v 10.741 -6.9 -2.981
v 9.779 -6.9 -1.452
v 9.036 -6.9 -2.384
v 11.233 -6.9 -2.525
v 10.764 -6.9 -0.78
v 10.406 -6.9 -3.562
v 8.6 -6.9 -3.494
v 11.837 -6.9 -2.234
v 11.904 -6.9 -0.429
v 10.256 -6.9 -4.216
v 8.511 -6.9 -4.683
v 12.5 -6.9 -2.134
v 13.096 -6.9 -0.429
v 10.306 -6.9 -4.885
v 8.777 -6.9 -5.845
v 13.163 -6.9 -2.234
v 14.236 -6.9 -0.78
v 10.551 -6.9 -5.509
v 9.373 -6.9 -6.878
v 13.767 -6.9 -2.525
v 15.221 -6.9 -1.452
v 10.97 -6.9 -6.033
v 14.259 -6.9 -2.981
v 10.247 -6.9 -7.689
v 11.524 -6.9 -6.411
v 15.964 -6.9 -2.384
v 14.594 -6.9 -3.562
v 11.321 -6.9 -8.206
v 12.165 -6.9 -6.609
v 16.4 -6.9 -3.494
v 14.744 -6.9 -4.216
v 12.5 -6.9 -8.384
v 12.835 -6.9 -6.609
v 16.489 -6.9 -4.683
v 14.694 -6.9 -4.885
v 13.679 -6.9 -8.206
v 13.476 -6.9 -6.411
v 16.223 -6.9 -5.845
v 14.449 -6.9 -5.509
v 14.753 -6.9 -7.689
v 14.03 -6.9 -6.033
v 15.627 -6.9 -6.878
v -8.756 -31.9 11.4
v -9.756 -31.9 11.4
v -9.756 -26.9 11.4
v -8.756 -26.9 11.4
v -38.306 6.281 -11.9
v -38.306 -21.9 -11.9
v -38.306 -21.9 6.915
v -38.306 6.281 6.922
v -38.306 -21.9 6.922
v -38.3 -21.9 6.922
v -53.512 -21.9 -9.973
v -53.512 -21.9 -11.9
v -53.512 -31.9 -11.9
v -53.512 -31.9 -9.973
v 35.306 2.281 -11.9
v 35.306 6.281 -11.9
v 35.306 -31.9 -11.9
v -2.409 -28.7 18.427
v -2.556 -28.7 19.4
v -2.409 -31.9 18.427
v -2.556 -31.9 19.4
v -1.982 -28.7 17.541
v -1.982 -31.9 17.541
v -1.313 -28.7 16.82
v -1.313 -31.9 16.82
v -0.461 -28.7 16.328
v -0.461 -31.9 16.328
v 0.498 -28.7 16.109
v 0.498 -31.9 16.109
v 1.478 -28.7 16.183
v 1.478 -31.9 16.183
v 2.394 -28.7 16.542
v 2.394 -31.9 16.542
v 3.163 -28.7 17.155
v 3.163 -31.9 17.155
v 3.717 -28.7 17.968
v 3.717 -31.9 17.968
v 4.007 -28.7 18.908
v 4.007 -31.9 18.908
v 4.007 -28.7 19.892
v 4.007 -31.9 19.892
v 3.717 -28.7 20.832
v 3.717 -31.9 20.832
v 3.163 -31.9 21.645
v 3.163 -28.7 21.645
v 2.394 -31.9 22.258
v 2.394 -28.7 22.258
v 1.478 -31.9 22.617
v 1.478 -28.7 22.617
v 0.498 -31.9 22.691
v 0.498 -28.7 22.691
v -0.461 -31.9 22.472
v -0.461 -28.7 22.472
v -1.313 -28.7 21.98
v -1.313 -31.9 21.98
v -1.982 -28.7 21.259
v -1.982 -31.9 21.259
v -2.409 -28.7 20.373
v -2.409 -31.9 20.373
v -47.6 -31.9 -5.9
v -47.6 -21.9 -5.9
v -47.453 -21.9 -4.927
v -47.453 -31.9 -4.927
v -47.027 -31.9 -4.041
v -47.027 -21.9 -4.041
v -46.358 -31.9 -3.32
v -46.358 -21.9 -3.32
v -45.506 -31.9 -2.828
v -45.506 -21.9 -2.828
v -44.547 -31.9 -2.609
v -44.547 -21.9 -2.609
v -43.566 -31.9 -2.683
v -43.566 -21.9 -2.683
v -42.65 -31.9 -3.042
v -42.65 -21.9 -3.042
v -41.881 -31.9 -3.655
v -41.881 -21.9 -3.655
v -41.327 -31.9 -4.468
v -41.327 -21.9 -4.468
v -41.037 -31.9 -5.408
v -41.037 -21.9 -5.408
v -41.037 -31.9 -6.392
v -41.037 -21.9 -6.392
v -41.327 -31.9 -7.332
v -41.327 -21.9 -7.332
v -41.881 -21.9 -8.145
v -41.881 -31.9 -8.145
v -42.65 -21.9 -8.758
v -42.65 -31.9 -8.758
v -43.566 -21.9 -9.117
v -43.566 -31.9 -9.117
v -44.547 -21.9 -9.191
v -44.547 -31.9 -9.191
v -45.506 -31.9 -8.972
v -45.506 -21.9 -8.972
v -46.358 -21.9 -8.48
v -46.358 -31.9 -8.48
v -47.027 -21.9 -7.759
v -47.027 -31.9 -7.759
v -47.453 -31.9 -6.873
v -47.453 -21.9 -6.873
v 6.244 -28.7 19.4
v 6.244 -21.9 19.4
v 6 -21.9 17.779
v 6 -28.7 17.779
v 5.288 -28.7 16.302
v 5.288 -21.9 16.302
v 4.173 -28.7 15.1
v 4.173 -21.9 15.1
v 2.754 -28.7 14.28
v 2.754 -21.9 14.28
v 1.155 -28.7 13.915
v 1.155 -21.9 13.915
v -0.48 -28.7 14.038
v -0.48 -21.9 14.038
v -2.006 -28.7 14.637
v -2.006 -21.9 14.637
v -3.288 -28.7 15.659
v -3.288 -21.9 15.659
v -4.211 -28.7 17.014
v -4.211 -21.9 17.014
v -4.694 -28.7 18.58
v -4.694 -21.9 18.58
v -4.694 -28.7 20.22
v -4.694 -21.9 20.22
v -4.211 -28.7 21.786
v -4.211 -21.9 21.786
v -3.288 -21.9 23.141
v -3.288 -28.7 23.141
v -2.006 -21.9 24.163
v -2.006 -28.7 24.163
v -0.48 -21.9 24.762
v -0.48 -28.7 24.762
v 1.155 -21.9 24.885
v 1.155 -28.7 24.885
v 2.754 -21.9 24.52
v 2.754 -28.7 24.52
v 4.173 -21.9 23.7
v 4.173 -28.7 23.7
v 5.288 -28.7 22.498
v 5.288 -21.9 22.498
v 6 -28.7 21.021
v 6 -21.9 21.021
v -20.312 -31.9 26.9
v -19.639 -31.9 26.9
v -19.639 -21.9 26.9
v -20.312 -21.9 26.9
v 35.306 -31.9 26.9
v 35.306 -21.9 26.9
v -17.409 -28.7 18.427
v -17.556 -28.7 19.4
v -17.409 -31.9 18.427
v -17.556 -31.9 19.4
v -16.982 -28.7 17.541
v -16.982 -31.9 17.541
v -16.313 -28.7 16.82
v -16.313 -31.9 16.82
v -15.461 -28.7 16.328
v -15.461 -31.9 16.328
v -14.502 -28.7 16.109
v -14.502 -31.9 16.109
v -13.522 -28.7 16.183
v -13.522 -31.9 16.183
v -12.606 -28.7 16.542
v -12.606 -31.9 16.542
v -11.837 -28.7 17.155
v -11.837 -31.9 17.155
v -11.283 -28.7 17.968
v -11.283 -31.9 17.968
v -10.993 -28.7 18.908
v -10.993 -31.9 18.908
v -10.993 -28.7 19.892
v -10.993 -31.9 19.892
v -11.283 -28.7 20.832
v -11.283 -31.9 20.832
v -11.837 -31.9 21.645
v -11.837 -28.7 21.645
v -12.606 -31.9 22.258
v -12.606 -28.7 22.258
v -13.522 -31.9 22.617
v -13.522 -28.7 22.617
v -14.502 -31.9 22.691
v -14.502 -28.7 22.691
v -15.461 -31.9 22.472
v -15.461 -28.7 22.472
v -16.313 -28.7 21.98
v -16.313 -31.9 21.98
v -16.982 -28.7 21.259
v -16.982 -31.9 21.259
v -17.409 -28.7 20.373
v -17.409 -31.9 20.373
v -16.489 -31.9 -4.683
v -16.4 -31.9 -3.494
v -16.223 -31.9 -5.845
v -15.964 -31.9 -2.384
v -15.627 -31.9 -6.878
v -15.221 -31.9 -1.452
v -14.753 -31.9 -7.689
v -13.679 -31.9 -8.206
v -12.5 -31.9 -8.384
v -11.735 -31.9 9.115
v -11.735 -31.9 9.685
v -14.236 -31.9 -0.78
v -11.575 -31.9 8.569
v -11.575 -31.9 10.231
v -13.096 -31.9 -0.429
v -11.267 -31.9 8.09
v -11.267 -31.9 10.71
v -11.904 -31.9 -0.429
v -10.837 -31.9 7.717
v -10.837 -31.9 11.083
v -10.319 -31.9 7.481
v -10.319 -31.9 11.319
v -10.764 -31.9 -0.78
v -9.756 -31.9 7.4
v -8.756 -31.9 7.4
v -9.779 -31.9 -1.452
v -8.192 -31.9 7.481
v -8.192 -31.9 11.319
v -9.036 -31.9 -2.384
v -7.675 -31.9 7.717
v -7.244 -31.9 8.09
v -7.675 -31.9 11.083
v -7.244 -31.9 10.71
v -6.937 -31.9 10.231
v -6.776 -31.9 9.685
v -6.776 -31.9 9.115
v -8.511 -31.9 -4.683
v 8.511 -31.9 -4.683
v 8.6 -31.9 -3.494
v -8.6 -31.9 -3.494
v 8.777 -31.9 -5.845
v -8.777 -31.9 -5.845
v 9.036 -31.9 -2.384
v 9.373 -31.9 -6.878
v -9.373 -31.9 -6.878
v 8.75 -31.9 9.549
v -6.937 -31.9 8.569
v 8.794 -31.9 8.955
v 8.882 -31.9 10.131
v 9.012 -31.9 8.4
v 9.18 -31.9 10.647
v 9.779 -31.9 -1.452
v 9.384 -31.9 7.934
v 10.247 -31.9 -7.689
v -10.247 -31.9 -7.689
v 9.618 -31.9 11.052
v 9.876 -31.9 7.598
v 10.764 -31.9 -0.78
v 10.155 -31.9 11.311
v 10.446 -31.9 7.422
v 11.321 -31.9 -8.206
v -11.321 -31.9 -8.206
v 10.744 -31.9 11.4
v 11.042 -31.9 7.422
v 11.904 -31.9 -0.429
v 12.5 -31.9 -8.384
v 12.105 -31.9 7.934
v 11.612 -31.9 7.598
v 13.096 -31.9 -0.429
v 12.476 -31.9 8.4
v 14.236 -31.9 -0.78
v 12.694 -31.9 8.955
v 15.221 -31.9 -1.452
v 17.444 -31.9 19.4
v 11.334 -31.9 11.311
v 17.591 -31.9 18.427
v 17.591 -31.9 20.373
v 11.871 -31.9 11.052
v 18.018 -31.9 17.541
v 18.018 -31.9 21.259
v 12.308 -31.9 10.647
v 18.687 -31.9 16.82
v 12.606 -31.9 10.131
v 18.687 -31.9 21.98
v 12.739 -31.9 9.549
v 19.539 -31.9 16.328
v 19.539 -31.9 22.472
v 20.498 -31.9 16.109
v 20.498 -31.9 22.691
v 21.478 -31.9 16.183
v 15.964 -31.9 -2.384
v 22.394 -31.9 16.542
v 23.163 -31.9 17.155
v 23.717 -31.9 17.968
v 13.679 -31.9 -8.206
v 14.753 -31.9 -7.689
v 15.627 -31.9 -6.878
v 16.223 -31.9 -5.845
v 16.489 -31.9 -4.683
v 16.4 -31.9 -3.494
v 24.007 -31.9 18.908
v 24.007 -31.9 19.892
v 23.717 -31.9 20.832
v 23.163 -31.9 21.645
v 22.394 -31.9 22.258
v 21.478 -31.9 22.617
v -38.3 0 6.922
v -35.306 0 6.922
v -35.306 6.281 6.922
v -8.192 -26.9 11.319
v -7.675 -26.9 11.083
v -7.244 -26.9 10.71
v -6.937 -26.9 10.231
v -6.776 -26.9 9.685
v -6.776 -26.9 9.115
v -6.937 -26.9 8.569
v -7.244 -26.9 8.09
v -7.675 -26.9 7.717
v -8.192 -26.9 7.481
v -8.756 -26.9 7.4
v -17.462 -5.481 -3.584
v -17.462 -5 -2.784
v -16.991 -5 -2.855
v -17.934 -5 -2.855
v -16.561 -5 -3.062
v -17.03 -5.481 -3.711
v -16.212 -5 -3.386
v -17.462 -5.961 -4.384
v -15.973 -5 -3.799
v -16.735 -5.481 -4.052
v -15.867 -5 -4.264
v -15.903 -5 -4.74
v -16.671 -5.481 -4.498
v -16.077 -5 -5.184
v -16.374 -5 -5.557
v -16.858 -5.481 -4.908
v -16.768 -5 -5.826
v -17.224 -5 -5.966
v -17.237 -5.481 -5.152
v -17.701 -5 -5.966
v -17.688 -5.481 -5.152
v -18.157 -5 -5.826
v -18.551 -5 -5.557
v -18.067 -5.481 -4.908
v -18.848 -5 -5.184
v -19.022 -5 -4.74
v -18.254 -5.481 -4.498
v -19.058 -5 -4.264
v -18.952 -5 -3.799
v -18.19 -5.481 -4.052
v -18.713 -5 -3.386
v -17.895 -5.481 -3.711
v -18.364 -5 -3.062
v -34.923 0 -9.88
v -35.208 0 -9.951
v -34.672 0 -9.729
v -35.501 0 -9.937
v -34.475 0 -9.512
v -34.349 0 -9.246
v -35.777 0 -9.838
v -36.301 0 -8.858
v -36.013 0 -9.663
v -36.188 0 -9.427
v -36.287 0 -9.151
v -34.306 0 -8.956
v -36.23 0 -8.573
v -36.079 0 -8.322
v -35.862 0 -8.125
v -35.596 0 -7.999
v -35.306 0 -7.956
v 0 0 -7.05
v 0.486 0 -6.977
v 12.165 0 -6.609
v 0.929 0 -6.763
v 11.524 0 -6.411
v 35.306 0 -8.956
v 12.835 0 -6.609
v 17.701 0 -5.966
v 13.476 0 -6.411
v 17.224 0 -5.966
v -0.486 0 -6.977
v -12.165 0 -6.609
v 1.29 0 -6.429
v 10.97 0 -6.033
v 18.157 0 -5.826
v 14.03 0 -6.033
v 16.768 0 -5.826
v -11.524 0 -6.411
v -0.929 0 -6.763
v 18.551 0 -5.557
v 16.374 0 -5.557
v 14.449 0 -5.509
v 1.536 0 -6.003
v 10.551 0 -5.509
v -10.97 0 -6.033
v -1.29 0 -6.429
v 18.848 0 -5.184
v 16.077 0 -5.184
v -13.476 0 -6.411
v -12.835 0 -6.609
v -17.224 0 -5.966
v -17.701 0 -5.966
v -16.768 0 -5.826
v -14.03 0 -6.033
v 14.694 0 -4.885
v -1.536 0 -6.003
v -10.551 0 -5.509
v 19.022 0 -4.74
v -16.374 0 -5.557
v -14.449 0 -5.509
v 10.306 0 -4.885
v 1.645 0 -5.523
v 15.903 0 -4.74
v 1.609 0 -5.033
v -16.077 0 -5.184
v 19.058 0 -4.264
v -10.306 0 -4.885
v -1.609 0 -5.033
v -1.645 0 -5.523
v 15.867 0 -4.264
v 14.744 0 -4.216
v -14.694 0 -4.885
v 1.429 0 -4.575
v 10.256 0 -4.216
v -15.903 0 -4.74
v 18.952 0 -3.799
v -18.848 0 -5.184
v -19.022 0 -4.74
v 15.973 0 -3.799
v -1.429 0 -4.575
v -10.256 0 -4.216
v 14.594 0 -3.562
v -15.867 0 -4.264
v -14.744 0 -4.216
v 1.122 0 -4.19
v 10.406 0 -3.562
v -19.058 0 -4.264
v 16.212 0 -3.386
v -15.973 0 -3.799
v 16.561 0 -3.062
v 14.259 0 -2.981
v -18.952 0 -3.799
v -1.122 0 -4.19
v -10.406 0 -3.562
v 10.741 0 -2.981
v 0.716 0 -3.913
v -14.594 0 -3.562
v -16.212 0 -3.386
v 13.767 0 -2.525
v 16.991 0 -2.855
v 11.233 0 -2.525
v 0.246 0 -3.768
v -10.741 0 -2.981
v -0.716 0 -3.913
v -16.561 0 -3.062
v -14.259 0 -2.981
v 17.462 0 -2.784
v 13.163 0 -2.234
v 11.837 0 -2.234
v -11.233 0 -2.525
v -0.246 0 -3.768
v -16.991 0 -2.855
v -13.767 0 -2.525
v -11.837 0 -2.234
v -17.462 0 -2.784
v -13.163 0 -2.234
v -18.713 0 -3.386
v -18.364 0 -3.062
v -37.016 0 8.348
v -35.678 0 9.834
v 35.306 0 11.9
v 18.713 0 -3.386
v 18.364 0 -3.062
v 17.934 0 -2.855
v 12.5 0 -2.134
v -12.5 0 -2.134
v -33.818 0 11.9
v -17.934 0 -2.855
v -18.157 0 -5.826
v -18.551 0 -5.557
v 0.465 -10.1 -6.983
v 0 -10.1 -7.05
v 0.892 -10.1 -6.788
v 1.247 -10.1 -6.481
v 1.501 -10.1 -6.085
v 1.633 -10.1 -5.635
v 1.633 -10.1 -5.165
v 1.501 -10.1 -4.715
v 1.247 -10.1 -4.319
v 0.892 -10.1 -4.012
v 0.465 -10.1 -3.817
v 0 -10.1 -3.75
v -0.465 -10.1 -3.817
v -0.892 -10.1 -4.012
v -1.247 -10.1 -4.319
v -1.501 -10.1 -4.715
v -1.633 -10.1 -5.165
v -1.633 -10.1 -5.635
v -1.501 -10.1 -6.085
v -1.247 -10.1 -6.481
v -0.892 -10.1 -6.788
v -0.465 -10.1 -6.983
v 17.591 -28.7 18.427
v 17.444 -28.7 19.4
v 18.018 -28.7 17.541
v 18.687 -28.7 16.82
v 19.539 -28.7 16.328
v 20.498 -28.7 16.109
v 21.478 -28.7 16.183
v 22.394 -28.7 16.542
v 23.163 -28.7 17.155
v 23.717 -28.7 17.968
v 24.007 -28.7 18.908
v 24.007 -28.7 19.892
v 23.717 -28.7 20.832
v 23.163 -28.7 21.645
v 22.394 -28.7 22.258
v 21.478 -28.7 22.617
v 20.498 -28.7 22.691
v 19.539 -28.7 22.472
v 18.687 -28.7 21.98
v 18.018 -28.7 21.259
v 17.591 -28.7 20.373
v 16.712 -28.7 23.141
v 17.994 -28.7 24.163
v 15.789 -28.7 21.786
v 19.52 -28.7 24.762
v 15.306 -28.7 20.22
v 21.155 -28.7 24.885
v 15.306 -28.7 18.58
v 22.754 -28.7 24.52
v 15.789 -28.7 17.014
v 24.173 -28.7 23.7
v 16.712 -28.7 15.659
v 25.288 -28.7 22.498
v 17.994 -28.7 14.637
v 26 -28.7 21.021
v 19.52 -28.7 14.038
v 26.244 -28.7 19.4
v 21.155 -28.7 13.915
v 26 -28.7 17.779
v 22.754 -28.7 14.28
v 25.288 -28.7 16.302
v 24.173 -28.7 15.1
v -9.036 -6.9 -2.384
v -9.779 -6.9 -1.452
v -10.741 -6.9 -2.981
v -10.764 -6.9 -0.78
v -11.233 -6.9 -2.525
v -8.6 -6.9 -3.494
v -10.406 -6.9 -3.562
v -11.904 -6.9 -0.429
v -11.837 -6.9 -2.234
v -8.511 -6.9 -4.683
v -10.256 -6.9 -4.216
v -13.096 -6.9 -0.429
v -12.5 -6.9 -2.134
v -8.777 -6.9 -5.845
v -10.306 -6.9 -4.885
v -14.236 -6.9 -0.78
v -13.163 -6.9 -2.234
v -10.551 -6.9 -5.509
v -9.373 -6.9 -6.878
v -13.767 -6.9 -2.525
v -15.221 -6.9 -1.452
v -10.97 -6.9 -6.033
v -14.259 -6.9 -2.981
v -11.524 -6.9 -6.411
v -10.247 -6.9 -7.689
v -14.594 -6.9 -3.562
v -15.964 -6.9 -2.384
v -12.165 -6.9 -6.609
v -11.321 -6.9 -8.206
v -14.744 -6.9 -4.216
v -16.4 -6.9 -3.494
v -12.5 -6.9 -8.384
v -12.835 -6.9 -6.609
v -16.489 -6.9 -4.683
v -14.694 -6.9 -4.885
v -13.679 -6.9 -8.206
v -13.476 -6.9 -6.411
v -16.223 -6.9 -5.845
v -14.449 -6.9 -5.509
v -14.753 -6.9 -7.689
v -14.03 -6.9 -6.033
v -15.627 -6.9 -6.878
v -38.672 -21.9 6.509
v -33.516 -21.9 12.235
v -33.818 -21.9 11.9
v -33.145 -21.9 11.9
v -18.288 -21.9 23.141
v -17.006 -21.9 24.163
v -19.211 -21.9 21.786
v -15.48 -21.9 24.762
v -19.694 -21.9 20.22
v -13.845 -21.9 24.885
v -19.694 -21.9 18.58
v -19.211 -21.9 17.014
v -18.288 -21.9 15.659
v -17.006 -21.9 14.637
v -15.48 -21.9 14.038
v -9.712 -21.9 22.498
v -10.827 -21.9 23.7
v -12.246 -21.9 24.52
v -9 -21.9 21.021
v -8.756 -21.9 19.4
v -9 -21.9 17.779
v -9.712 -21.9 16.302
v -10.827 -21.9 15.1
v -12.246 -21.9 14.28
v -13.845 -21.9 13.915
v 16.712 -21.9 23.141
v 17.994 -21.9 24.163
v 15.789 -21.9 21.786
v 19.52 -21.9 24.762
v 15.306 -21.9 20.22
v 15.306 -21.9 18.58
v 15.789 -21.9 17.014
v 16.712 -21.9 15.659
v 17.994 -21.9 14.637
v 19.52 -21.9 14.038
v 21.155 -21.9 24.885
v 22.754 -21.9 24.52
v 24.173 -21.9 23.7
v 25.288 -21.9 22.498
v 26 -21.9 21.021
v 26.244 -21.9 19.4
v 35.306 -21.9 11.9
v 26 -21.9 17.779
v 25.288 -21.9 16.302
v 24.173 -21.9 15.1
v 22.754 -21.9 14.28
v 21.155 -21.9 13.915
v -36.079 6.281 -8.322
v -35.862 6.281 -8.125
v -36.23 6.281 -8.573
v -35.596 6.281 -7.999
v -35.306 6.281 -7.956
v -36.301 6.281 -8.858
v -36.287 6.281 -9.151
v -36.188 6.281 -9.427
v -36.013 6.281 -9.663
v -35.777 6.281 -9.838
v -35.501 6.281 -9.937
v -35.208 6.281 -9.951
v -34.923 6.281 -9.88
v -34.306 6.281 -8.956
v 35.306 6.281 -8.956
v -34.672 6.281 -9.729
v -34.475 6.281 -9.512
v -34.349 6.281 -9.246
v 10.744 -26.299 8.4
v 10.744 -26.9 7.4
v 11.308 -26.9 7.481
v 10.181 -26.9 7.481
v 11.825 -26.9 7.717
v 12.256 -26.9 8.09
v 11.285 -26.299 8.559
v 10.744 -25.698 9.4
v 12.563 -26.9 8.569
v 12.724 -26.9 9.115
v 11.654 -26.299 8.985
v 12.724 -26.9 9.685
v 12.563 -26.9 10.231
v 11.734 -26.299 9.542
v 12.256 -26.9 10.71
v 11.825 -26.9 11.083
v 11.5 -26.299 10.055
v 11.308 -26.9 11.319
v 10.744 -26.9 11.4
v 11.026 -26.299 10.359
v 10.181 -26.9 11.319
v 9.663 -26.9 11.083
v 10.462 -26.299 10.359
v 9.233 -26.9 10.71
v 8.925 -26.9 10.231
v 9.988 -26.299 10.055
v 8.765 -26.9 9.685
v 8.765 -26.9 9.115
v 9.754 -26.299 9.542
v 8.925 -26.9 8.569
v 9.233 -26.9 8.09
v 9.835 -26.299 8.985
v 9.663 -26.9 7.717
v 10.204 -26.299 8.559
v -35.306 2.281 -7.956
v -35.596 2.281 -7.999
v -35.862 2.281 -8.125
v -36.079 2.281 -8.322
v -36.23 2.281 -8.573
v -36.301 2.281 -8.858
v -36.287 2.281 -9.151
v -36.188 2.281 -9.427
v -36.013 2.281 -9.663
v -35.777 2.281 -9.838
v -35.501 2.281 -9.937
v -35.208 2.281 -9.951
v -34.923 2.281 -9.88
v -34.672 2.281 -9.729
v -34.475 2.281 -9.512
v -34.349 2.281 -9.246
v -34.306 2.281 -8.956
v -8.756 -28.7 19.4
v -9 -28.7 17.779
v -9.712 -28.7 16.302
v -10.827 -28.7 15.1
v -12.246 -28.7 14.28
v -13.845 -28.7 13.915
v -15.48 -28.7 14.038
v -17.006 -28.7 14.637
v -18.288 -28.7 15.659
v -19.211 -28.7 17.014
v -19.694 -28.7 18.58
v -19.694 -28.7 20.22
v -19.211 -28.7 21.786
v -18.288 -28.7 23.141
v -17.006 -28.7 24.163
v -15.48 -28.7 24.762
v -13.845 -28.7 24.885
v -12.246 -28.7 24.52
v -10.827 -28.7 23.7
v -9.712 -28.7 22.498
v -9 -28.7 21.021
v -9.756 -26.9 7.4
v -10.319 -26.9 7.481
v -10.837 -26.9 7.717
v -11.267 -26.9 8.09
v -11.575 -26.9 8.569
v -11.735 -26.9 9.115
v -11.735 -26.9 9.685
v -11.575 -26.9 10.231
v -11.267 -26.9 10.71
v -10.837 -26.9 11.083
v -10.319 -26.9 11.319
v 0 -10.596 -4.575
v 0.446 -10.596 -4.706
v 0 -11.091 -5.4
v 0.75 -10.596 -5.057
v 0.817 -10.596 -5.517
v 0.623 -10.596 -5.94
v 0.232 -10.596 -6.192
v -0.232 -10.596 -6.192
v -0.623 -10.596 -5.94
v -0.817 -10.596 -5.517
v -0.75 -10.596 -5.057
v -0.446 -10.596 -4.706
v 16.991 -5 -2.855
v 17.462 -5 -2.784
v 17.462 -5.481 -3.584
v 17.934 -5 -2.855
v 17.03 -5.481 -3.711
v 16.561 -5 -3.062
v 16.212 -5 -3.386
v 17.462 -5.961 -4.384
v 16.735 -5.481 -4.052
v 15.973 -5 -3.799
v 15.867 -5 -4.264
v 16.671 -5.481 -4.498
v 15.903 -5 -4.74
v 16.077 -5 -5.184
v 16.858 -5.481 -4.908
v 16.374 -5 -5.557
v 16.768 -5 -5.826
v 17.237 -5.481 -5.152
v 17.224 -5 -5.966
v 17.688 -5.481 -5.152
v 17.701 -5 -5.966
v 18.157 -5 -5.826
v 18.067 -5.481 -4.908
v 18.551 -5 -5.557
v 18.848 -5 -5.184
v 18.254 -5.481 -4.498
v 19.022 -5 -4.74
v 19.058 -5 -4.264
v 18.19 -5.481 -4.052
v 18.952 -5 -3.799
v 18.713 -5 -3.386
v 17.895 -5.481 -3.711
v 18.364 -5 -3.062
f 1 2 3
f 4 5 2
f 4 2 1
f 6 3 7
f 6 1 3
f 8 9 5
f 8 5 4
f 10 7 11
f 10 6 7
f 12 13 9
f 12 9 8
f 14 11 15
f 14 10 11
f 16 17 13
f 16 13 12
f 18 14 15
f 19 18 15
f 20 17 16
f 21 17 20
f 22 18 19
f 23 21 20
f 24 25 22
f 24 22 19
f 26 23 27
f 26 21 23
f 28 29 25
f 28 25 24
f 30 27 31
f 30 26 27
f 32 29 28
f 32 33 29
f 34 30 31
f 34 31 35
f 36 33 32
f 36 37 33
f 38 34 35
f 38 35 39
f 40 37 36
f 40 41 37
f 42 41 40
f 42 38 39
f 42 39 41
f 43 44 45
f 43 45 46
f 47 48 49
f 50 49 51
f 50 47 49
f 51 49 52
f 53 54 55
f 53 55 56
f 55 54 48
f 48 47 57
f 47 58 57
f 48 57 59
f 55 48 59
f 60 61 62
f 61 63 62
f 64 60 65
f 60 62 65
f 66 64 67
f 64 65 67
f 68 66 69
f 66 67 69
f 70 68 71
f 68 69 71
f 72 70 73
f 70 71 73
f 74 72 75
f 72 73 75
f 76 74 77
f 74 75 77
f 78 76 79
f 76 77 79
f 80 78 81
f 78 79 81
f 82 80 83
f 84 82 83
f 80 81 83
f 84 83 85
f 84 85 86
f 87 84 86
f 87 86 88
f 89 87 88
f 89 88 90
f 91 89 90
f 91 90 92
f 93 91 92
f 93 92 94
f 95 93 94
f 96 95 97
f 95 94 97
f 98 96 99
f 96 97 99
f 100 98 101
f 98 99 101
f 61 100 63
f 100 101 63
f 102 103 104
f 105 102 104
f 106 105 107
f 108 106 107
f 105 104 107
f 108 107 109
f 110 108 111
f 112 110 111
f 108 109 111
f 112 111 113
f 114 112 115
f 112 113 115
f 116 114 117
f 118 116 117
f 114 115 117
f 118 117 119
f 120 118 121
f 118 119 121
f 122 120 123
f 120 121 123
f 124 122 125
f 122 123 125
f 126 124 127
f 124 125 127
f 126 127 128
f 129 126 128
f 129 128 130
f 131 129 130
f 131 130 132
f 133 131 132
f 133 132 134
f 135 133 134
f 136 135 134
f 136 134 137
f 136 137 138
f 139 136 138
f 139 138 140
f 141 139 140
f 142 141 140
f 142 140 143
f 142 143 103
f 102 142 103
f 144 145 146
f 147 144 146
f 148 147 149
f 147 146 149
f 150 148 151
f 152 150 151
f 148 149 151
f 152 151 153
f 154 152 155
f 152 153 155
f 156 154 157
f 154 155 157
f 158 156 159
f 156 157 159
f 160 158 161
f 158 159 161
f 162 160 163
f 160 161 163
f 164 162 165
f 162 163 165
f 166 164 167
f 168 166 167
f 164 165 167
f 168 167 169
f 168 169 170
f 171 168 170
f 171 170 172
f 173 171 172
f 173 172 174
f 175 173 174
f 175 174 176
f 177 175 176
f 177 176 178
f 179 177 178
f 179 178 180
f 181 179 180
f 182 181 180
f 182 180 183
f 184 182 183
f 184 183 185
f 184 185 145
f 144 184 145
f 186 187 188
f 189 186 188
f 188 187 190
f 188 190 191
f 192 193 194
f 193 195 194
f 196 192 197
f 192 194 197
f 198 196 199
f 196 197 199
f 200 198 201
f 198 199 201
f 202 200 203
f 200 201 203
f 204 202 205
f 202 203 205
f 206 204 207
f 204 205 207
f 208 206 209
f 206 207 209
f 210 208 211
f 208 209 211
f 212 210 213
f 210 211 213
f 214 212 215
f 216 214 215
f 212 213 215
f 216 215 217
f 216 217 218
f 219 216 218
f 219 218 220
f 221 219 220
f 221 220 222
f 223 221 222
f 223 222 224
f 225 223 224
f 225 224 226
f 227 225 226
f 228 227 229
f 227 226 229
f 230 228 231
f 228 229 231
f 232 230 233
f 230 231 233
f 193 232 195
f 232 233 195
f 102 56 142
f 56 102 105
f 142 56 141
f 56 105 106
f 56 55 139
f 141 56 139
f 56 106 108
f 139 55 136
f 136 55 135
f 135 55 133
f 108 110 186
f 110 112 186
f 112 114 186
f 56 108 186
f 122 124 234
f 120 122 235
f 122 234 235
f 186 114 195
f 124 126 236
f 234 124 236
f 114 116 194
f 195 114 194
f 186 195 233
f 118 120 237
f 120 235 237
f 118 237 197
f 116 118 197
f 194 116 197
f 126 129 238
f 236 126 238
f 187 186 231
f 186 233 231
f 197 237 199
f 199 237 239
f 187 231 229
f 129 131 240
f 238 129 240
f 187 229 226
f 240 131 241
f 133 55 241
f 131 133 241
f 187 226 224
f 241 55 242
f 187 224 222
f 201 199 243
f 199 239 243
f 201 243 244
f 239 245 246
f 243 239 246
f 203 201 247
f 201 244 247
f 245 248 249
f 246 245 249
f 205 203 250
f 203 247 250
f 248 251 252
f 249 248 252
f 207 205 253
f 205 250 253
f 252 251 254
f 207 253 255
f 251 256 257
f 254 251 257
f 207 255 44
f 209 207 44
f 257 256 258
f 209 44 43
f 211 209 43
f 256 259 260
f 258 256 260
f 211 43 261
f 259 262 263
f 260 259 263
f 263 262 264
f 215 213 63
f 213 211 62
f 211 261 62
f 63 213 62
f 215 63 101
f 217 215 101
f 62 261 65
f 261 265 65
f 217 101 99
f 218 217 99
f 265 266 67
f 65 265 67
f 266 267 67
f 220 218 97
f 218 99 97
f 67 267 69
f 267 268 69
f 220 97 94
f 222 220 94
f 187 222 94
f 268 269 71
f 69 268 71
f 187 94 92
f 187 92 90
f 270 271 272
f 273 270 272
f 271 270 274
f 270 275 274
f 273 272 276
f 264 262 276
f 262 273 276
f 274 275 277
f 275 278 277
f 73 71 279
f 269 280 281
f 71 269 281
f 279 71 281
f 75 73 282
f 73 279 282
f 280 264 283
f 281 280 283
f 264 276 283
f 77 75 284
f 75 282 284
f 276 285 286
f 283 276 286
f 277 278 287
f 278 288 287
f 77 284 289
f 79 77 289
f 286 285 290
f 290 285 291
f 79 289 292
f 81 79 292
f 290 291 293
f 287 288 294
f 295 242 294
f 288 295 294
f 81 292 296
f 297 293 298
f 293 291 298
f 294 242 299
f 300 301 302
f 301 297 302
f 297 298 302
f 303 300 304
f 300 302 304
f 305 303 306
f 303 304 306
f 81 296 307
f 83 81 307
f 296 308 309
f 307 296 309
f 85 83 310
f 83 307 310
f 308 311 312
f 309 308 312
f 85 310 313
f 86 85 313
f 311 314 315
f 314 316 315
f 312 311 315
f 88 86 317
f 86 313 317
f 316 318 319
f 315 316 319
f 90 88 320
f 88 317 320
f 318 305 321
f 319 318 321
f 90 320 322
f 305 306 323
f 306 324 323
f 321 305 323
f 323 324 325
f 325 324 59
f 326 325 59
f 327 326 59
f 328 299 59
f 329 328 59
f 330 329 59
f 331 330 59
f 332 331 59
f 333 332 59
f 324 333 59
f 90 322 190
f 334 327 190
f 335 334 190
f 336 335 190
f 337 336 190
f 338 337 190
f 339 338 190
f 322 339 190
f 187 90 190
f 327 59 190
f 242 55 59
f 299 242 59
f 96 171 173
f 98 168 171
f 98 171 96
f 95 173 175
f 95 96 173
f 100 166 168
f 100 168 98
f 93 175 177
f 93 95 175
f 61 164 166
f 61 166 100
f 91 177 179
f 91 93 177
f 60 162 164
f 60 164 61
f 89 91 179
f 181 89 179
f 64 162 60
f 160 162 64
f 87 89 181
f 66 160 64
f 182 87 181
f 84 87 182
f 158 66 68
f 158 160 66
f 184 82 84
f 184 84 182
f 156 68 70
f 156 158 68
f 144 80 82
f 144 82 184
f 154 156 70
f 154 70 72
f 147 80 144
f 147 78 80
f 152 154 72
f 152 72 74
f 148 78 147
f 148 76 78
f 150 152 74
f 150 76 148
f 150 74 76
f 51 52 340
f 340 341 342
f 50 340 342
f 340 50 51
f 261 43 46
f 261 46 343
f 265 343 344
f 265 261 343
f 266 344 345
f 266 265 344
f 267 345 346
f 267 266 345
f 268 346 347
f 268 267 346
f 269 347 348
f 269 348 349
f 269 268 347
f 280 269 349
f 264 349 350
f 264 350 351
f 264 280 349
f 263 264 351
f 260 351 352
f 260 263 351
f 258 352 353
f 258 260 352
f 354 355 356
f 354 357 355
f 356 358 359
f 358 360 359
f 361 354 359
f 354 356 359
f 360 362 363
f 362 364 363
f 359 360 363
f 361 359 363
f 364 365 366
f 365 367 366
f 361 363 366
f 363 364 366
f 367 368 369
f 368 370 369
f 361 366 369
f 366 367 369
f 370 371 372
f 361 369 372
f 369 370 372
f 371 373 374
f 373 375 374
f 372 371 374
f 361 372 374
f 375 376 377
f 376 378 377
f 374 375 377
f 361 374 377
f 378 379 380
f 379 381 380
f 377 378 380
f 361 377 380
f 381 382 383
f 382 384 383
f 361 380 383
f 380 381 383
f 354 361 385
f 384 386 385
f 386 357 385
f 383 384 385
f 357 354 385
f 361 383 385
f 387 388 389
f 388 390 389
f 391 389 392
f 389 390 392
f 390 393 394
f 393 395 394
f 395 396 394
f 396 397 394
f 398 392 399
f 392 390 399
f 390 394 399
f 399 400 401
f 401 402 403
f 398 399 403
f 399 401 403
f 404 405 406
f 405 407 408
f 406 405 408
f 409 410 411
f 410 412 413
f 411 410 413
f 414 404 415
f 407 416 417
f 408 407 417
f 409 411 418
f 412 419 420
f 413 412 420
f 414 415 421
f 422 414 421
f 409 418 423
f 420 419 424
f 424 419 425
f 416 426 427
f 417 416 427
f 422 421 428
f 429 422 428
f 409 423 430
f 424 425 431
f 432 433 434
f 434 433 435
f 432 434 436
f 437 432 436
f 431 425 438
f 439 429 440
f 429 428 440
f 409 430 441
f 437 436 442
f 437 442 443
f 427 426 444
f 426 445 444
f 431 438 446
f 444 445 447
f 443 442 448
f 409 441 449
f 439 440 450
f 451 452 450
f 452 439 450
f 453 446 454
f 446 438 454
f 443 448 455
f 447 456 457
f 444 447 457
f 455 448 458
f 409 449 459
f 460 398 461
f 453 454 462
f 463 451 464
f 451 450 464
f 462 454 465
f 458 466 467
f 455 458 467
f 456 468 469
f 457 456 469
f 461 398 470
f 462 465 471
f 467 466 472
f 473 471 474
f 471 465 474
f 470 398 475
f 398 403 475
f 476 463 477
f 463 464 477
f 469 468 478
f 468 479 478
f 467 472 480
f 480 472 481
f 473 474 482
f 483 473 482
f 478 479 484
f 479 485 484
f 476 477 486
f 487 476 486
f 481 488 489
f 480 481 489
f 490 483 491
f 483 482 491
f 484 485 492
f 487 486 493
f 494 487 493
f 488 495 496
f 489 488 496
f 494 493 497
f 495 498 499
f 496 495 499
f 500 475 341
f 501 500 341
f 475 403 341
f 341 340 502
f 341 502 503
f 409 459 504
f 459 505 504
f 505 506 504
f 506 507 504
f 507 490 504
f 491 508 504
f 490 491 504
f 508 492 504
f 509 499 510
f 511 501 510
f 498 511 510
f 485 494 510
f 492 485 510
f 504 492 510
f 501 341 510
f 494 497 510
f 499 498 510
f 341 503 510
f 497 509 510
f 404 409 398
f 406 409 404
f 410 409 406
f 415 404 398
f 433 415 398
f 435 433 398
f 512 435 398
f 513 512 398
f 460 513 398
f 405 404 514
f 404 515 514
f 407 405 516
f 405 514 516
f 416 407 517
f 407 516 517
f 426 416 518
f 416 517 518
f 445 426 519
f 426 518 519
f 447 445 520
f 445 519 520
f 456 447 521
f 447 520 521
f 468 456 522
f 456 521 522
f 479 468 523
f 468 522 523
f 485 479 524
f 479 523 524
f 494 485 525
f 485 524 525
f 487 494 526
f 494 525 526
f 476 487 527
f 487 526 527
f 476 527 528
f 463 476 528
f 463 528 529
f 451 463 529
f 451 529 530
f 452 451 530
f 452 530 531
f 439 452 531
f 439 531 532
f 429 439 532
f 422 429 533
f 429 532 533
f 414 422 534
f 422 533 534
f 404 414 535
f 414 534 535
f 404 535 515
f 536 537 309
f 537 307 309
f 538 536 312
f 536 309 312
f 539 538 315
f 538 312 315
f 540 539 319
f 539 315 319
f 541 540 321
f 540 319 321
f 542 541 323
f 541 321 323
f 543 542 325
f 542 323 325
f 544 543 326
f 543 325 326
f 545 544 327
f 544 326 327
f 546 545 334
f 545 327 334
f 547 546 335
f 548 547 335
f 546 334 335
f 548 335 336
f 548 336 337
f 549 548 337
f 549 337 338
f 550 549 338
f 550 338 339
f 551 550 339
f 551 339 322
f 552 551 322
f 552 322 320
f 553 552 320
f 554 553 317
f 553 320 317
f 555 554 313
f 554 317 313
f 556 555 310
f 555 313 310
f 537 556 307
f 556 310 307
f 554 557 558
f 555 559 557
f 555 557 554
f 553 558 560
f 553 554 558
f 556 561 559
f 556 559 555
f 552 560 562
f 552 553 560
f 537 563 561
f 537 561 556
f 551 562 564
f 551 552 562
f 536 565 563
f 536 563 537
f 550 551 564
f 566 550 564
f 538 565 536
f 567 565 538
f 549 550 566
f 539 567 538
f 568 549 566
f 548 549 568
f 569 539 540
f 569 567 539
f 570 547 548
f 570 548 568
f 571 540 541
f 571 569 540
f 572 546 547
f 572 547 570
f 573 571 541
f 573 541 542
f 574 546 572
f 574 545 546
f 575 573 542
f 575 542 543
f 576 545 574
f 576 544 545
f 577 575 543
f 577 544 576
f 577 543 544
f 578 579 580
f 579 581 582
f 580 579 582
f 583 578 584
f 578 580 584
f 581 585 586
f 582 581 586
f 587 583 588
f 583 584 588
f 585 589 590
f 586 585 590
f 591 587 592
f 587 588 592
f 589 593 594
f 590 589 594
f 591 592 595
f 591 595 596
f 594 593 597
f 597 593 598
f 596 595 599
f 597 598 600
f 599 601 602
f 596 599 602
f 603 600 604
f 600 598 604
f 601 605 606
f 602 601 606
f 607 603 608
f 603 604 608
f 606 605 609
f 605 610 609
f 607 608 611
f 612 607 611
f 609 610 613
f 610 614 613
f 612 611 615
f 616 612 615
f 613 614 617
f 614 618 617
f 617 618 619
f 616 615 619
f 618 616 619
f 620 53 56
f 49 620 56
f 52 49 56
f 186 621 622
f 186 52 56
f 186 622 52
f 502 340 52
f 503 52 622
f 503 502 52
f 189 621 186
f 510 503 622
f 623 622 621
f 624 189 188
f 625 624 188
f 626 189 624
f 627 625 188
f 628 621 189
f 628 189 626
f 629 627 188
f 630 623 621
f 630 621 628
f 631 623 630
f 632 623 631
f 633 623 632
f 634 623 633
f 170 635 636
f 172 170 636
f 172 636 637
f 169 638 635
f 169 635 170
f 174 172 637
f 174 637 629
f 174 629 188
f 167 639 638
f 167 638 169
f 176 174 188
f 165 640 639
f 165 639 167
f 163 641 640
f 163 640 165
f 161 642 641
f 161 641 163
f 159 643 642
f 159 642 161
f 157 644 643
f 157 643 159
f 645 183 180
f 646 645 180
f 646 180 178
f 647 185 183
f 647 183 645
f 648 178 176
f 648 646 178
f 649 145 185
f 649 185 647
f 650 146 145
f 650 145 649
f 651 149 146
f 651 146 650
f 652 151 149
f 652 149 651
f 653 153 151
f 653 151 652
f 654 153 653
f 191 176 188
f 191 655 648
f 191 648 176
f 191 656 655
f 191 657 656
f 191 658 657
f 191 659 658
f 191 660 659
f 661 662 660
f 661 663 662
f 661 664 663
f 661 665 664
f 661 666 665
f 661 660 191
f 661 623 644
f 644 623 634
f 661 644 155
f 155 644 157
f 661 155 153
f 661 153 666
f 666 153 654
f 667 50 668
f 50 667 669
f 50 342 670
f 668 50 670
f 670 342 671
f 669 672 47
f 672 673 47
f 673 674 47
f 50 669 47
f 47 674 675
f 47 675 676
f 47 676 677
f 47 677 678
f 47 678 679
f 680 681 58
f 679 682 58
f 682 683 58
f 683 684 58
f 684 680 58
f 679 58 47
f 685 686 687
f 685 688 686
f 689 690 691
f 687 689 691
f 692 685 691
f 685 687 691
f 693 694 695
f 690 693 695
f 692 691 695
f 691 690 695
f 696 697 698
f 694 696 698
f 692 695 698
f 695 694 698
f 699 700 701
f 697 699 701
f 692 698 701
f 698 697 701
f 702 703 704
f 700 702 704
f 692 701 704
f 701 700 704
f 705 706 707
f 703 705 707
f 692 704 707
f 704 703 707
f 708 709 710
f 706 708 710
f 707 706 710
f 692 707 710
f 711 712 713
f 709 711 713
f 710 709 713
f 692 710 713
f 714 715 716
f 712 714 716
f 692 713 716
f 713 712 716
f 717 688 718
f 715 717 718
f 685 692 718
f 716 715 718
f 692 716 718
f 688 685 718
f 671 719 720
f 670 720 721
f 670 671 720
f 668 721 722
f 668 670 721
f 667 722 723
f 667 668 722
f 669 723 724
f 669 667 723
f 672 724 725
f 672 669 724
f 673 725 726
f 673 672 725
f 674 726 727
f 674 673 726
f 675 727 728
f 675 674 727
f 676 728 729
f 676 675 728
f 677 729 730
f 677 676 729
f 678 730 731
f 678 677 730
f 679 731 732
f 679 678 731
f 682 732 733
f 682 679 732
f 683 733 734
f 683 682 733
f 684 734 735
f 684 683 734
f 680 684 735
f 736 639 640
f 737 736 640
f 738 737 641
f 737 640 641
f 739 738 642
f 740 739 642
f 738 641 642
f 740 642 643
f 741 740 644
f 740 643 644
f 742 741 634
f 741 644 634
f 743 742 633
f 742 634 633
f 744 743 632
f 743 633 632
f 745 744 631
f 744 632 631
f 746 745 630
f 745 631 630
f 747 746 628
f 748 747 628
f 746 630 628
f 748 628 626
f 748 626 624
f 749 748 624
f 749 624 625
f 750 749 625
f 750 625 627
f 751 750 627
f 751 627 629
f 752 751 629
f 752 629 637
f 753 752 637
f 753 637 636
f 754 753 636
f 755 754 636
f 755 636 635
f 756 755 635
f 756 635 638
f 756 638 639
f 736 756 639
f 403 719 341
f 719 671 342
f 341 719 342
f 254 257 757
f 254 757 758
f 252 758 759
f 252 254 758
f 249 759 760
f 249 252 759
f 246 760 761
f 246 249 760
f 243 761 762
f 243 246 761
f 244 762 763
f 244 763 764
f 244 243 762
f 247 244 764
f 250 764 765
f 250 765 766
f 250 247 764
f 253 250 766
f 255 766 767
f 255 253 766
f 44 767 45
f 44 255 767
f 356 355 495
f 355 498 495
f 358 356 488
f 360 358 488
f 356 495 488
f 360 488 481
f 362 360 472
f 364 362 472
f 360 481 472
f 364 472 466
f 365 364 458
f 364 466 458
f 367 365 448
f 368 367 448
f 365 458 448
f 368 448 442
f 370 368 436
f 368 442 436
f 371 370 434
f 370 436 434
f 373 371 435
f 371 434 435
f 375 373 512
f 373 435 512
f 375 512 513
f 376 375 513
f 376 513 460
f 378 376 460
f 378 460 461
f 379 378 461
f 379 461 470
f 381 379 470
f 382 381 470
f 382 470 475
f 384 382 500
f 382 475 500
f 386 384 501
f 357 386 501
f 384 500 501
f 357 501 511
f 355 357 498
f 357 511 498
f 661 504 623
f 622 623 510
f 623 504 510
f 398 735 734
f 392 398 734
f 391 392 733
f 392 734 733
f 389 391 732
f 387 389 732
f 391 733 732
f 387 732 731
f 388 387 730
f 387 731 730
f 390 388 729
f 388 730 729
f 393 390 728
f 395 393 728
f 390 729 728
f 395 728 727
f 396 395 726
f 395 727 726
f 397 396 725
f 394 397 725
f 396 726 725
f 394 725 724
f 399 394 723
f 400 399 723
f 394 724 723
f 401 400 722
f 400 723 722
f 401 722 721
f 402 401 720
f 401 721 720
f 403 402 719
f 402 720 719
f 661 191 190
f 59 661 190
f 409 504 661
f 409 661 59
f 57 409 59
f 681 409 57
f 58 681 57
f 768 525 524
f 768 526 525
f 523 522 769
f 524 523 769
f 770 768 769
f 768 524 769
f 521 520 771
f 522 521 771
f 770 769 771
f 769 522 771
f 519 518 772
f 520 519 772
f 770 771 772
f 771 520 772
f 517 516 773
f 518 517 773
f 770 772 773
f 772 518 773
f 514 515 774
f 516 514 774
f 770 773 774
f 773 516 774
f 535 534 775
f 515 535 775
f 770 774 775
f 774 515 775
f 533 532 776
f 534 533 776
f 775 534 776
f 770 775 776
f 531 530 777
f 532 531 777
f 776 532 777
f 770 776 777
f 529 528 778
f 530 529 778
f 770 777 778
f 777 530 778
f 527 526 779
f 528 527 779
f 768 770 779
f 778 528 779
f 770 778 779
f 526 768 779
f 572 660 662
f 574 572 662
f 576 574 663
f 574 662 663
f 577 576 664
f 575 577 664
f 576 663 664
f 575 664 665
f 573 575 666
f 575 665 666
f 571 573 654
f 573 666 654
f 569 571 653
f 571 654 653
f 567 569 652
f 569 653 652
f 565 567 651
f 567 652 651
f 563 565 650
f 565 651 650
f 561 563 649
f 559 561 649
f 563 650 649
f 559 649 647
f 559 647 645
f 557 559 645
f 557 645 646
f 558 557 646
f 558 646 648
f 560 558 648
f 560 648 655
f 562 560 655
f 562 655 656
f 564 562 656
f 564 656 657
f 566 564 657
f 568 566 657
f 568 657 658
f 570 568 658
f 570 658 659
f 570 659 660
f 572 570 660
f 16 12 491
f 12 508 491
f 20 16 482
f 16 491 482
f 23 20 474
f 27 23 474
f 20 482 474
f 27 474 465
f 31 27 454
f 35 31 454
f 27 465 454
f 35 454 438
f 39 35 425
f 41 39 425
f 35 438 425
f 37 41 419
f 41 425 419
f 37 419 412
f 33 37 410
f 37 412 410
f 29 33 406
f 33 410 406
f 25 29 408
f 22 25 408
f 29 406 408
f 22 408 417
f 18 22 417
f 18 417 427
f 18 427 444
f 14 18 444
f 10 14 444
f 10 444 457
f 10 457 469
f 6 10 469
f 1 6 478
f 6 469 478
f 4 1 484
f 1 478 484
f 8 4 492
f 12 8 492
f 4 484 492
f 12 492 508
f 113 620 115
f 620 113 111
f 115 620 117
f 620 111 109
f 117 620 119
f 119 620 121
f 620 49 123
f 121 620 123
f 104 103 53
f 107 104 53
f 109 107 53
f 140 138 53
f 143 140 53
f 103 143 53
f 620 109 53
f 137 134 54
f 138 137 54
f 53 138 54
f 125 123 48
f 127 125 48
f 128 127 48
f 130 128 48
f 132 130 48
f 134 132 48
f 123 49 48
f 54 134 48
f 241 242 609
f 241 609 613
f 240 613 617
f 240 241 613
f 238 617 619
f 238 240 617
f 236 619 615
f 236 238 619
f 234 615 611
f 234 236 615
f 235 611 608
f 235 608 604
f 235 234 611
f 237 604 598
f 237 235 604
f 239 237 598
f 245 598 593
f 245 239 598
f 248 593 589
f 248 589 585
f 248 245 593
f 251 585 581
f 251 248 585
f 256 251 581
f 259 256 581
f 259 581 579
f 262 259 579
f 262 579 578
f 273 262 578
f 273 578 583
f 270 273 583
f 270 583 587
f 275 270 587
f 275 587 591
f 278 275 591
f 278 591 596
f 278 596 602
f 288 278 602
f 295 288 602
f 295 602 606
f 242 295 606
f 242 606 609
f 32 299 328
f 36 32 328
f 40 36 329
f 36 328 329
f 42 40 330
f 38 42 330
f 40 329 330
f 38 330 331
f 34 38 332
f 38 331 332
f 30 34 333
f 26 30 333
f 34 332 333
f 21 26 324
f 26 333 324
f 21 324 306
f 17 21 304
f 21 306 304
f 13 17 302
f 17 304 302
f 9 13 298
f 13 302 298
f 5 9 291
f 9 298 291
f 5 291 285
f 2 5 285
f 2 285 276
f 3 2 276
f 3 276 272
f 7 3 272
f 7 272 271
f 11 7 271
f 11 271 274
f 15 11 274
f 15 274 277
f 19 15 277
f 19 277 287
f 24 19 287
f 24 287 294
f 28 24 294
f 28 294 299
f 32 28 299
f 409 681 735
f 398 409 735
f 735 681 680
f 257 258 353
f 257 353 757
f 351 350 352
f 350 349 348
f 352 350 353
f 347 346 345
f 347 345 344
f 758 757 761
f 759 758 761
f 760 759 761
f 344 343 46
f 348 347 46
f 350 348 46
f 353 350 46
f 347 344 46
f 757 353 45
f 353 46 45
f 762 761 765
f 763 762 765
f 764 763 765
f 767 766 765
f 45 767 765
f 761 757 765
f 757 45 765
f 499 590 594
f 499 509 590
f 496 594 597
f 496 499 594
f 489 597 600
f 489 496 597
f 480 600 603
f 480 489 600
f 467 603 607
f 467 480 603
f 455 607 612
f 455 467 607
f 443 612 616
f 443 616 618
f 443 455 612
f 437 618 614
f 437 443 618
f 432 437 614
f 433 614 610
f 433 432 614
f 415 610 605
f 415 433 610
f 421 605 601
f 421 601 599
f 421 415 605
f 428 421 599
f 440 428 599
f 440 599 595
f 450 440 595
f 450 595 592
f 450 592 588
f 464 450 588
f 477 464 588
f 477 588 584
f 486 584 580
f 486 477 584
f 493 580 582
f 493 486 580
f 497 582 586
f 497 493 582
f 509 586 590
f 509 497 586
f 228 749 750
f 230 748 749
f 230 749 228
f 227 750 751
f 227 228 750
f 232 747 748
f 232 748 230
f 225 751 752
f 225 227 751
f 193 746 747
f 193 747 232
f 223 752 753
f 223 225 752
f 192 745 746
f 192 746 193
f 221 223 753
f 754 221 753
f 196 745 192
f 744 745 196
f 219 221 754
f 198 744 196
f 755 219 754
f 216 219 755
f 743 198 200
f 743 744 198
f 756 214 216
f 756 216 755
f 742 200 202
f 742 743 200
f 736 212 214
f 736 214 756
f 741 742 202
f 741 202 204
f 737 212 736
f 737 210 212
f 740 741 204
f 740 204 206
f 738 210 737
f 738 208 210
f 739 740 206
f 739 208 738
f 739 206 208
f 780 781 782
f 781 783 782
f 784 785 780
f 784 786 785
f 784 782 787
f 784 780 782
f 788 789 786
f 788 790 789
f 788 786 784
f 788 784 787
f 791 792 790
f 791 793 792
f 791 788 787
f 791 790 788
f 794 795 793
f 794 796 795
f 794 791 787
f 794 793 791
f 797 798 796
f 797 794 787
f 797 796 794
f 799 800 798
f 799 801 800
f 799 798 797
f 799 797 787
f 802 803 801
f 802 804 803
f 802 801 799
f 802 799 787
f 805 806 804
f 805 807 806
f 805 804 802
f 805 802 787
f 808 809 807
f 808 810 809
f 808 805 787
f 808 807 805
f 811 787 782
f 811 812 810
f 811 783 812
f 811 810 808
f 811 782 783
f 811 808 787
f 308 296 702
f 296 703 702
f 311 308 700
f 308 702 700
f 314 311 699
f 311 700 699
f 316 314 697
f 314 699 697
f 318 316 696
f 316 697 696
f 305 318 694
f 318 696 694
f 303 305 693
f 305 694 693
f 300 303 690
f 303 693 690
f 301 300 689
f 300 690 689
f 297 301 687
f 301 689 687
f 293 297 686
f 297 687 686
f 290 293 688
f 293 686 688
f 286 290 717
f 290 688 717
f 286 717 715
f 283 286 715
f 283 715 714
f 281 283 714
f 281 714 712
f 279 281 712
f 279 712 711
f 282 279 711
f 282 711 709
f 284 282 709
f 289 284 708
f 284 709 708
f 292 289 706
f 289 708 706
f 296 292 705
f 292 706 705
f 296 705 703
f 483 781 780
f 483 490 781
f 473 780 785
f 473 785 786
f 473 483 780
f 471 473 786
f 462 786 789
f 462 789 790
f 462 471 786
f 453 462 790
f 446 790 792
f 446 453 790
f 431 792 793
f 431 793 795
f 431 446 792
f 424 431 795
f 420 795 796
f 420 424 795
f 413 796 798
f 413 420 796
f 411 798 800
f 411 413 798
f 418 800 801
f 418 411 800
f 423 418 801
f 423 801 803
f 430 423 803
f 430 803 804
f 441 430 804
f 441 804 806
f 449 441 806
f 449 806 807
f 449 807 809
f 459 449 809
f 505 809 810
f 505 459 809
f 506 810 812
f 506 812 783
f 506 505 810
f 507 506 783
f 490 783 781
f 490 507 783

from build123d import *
from build123d.topology import SkipClean

# Parameters (mm, degrees)
SKETCH_1_W                = 76.6
SKETCH_1_H                = 23.8
EXTRUDE_1_DEPTH           = 31.899999991
HOLE_WIZARD_M4_1_D        = 3.3
HOLE_WIZARD_M4_1_DEPTH    = 10.1
HOLE_WIZARD_M4_1_TIP      = 0.991420021
SKETCH_5_W                = 23.8
SKETCH_5_H                = 2.281370048
EXTRUDE_2_DEPTH           = 2.994
SKETCH_6_W                = 76.6
SKETCH_6_H                = 2.281370048
EXTRUDE_3_DEPTH           = 2.944
CUT_EXTRUDE_START         = -2.994
SKETCH_7_W                = 26.992148155
SKETCH_7_H                = 47.339562986
CUT_EXTRUDE_1_DEPTH       = 2.994
EXTRUDE_4_DEPTH           = 10
HOLE_WIZARD_3_D           = 6.6
HOLE_WIZARD_3_CBORE_D     = 11
HOLE_WIZARD_3_CBORE_DEPTH = 6.8
SKETCH_21_R               = 3.3
CUT_EXTRUDE_6_DEPTH       = 67.034934903
MM_2_D                    = 4
MM_2_DEPTH                = 5
MM_2_TIP                  = 1.201721238
CUT_EXTRUDE_7_DEPTH       = 5
SKETCH_26_W               = 46.053862543
SKETCH_26_H               = 10
CUT_EXTRUDE_8_DEPTH       = 76.924939501
CUT_EXTRUDE_9_DEPTH       = 67.034934903
SKETCH_29_R               = 1
CUT_EXTRUDE_10_DEPTH      = 2.281370048
EXTRUDE_START             = 4
EXTRUDE_5_DEPTH           = 4
CUT_EXTRUDE_11_DEPTH      = 0.5
EXTRUDE_6_DEPTH           = 0.499988059
CUT_EXTRUDE_12_DEPTH      = 28.181370038
SKETCH_35_W               = 0.334557313
SKETCH_35_H               = 10
CUT_EXTRUDE_13_DEPTH      = 100.522674932
CHAMFER_1_SIZE            = 2
HOLE_WIZARD_4_D           = 4.5
HOLE_WIZARD_4_CBORE_D     = 8
HOLE_WIZARD_4_CBORE_DEPTH = 25
CUT_EXTRUDE_14_DEPTH      = 67.269104052
CUT_EXTRUDE_15_DEPTH      = 6.281370048
EXTRUDE_9_DEPTH           = 0.006


with BuildPart() as part:
    # 草图1 → 凸台-拉伸1 (new body)
    with BuildSketch(Plane(origin=(0, 0, 0), x_dir=(1, 0, 0), z_dir=(0, 1, 0))):
        Rectangle(SKETCH_1_W, SKETCH_1_H)
    extrude(amount=-EXTRUDE_1_DEPTH)

    # M4 螺纹孔1
    with Locations(Plane(origin=(0, 0, -5.4), x_dir=(0, 0, 1), z_dir=(0, 1, 0))):
        with Locations((0, 0)):
            Hole(HOLE_WIZARD_M4_1_D / 2, depth=HOLE_WIZARD_M4_1_DEPTH)
            with Locations((0, 0, -(HOLE_WIZARD_M4_1_DEPTH + HOLE_WIZARD_M4_1_TIP / 2))):  # 118° drill point
                Cone(0, HOLE_WIZARD_M4_1_D / 2, HOLE_WIZARD_M4_1_TIP, mode=Mode.SUBTRACT)

    # 草图5 → 凸台-拉伸2 (add)
    with BuildSketch(Plane.ZY.offset(38.3)):
        with Locations((0, 1.140685024)):
            Rectangle(SKETCH_5_W, SKETCH_5_H)
    extrude(amount=-EXTRUDE_2_DEPTH)

    # 草图6 → 凸台-拉伸3 (add)
    with BuildSketch(Plane(origin=(0, 0, -11.9), x_dir=(-1, 0, 0), z_dir=(0, 0, -1))):
        with Locations((0, 1.140685024)):
            Rectangle(SKETCH_6_W, SKETCH_6_H)
    extrude(amount=-EXTRUDE_3_DEPTH)

    # 草图7 → 切除-拉伸1 (cut)
    with BuildSketch(Plane(origin=(38.3, 0, 0), x_dir=(0, 0, -1), z_dir=(1, 0, 0)).offset(CUT_EXTRUDE_START)):
        with Locations((-1.596074077, -8.230218498)):
            Rectangle(SKETCH_7_W, SKETCH_7_H)
    extrude(amount=CUT_EXTRUDE_1_DEPTH, mode=Mode.SUBTRACT)

    # 草图9 → 大小mm 暗销孔1 (revolve, cut)
    with BuildSketch(Plane(origin=(17.4625, 0, -4.384), x_dir=(0, 0, 1), z_dir=(1, 0, 0))):
        Polygon((0, 0), (0, 5.96137699), (1.6, 5), (1.6, 0), align=None)
    mm_1 = revolve(axis=Axis((17.4625, 6.35, -4.384), (0, -1, 0)), mode=Mode.SUBTRACT)

    # 镜向3: 大小mm 暗销孔1 across plane
    add(mm_1.mirror(Plane(origin=(0, 0, 0), x_dir=(0, 0, 1), z_dir=(1, 0, 0))), mode=Mode.SUBTRACT)

    # 草图16 → 凸台-拉伸4 (add)
    with BuildSketch(Plane.XZ.offset(31.899999991)):
        Polygon((-38.3, 6.921881597), (-55.247298311, -11.9), (-38.3, -11.9), align=None)
        Polygon((-33.817682057, 11.9), (-20.311621392, 26.9), (35.306, 26.9), (35.306, 11.9), align=None)
    extrude(amount=-EXTRUDE_4_DEPTH)

    # 打孔尺寸(%根据)内六角圆柱头螺钉的类型3 (through all)
    with Locations(Plane(origin=(-14.255841028, -21.899999991, 19.4), x_dir=(1, 0, 0), z_dir=(0, 1, 0))):
        with Locations((0, 0), (15, 0), (35, 0)):
            CounterBoreHole(HOLE_WIZARD_3_D / 2, HOLE_WIZARD_3_CBORE_D / 2, HOLE_WIZARD_3_CBORE_DEPTH)

    # 草图21 → 切除-拉伸6 (cut, through all)
    with BuildSketch(Plane(origin=(0, -21.899999991, 0), x_dir=(1, 0, 0), z_dir=(0, 1, 0))):
        with Locations(Location((-44.3, 5.9, 0), (0, 0, 180))):
            Circle(SKETCH_21_R)
    extrude(amount=-CUT_EXTRUDE_6_DEPTH, mode=Mode.SUBTRACT)

    # 大小mm 暗销孔2
    with Locations(Plane(origin=(10.744158972, -31.899999991, 9.4), x_dir=(0, 0, -1), z_dir=(0, -1, 0))):
        with Locations((0, 0)):
            Hole(MM_2_D / 2, depth=MM_2_DEPTH)
            with Locations((0, 0, -(MM_2_DEPTH + MM_2_TIP / 2))):  # 118° drill point
                Cone(0, MM_2_D / 2, MM_2_TIP, mode=Mode.SUBTRACT)

    # 草图25 → 切除-拉伸7 (cut)
    with BuildSketch(Plane.XZ.offset(31.899999991)):
        with BuildLine():
            Line((-9.755841028, 11.4), (-8.755841028, 11.4))
            ThreePointArc((-8.755841028, 11.4), (-6.755841028, 9.4), (-8.755841028, 7.4))
            Line((-8.755841028, 7.4), (-9.755841028, 7.4))
            ThreePointArc((-9.755841028, 7.4), (-11.755841028, 9.4), (-9.755841028, 11.4))
        make_face()
    extrude(amount=-CUT_EXTRUDE_7_DEPTH, mode=Mode.SUBTRACT)

    # 草图26 → 切除-拉伸8 (cut, through all)
    with BuildSketch(Plane(origin=(-24.593701474, 0, 22.144268272), x_dir=(0.6691306063588817, 0, 0.7431448254773731), z_dir=(-0.7431448254773731, 0, 0.6691306063588817))):
        with Locations((-11.827706241, -26.899999991)):
            Rectangle(SKETCH_26_W, SKETCH_26_H)
    extrude(amount=CUT_EXTRUDE_8_DEPTH, mode=Mode.SUBTRACT)

    # 草图27 → 切除-拉伸9 (cut, through all)
    with BuildSketch(Plane.XZ.offset(21.899999991)):
        Polygon((-38.3, 6.921881597), (-33.817682057, 11.9), (-38.3, 11.9), align=None)
    extrude(amount=-CUT_EXTRUDE_9_DEPTH, mode=Mode.SUBTRACT)

    # 草图29 → 切除-拉伸10 (cut)
    with BuildSketch(Plane(origin=(0, 2.281370048, 0), x_dir=(1, 0, 0), z_dir=(0, 1, 0))):
        with Locations((-35.306, 8.956)):
            Circle(SKETCH_29_R)
    extrude(amount=-CUT_EXTRUDE_10_DEPTH, mode=Mode.SUBTRACT)

    # 草图31 → 凸台-拉伸5 (add)
    with SkipClean():  # the faces are left unmerged after this step: merging them gives an invalid solid
        with BuildSketch(Plane(origin=(0, 2.281370048, 0), x_dir=(1, 0, 0), z_dir=(0, 1, 0)).offset(EXTRUDE_START)):
            with BuildLine():
                Line((-34.306, 8.956), (35.306, 8.956))
                Line((35.306, 8.956), (35.306, 11.9))
                Line((35.306, 11.9), (-38.3, 11.9))
                Line((-38.3, 11.9), (-38.3, -6.921881597))
                Line((-38.3, -6.921881597), (-35.306, -10.247055466))
                Line((-35.306, -10.247055466), (-35.306, 7.956))
                ThreePointArc((-35.306, 7.956), (-36.013106781, 9.663106781), (-34.306, 8.956))
            make_face()
        extrude(amount=-EXTRUDE_5_DEPTH)

    # 草图32 → 切除-拉伸11 (cut)
    with SkipClean():  # the faces are left unmerged after this step: merging them gives an invalid solid
        with BuildSketch(Plane(origin=(-24.593701474, 0, 22.144268272), x_dir=(0.6691306063588817, 0, 0.7431448254773731), z_dir=(-0.7431448254773731, 0, 0.6691306063588817))):
            Polygon((-23.813531784, -21.899999991), (-45.811081642, -21.899999991), (-45.811081642, -31.899999991), (7.49870663, -31.899999991), (7.49870663, -21.899999991), (-11.951824765, -21.899999991), (-11.951824765, 0), (-16.009278942, 0), (-16.009278942, 6.281370048), (-23.813531784, 6.281370048), align=None)
        extrude(amount=-CUT_EXTRUDE_11_DEPTH, mode=Mode.SUBTRACT)

    # 草图33 → 凸台-拉伸6 (add)
    with SkipClean():  # the faces are left unmerged after this step: merging them gives an invalid solid
        with BuildSketch(Plane(origin=(-24.222129061, 0, 21.809702968), x_dir=(0.6691306063588818, 0, 0.743144825477373), z_dir=(-0.743144825477373, 0, 0.6691306063588818))):
            Polygon((-45.36087962, -21.899999991), (-45.36087962, -31.899999991), (6.849670289, -31.899999991), (6.849670289, -21.899999991), (-13.334820655, -21.899999991), (-13.334820655, 0), (-16.564585199, 0), (-16.564585199, 6.281370048), (-21.03904799, 6.281370048), (-21.03904799, -21.899999991), align=None)
        extrude(amount=EXTRUDE_6_DEPTH)

    # 草图34 → 切除-拉伸12 (cut)
    with SkipClean():  # the faces are left unmerged after this step: merging them gives an invalid solid
        with BuildSketch(Plane(origin=(0, 6.281370048, 0), x_dir=(1, 0, 0), z_dir=(0, 1, 0))):
            Polygon((-38.3, -6.174643322), (-38.3, -6.921863751), (-38.671563539, -6.509200635), align=None)
            Polygon((-33.144865692, -11.9), (-33.817665989, -11.9), (-33.516429231, -12.234557313), align=None)
        extrude(amount=-CUT_EXTRUDE_12_DEPTH, mode=Mode.SUBTRACT)

    # 草图35 → 切除-拉伸13 (cut, through all)
    with SkipClean():  # the faces are left unmerged after this step: merging them gives an invalid solid
        with BuildSketch(Plane(origin=(35.306, 0, 0), x_dir=(0, 0, -1), z_dir=(1, 0, 0))):
            with Locations((-27.067278657, -26.899999991)):
                Rectangle(SKETCH_35_W, SKETCH_35_H)
        extrude(amount=-CUT_EXTRUDE_13_DEPTH, mode=Mode.SUBTRACT)

    # 倒角1
    # the kernel refuses this chamfer: 2 mm, written as the material it takes off along each edge
    with BuildSketch(Plane(origin=(-54.946045485, -16.756634015, -11.565442687), x_dir=(0.7244655223975927, 0, -0.6893110378176047), z_dir=(0, -1, 0))) as chamfer_1_piece_1:
        Polygon((CHAMFER_1_SIZE * 0.999621916911, CHAMFER_1_SIZE * 0.0274958766106), (-CHAMFER_1_SIZE * 0.0274958766106, CHAMFER_1_SIZE * 0.999621916911), (0, 0), align=None)
    extrude(amount=20.286731952, mode=Mode.SUBTRACT)
    with BuildSketch(Plane(origin=(-35.677563539, 0, 9.834374504), x_dir=(-0.6893110378176056, 0, -0.7244655223975918), z_dir=(0, 1, 0))) as chamfer_1_piece_2:
        Polygon((CHAMFER_1_SIZE * 0.999621916911, -CHAMFER_1_SIZE * 0.0274958766106), (-CHAMFER_1_SIZE * 0.0274958766106, -CHAMFER_1_SIZE * 0.999621916911), (0, 0), align=None)
    extrude(amount=11.424736024, mode=Mode.SUBTRACT)

    # 打孔尺寸(%根据)内六角圆柱头螺钉的类型4 (through all)
    with Locations(Plane(origin=(12.5, -31.899999991, -4.384), x_dir=(0, 0, -1), z_dir=(0, -1, 0))):
        with Locations((0, 0)):
            hole_wizard_4 = CounterBoreHole(HOLE_WIZARD_4_D / 2, HOLE_WIZARD_4_CBORE_D / 2, HOLE_WIZARD_4_CBORE_DEPTH)

    # 镜向4: 打孔尺寸(%根据)内六角圆柱头螺钉的类型4 across plane
    add(hole_wizard_4.mirror(Plane(origin=(0, 0, 0), x_dir=(0, 0, 1), z_dir=(1, 0, 0))), mode=Mode.SUBTRACT)

    # 草图39 → 切除-拉伸14 (cut, through all)
    with BuildSketch(Plane(origin=(0, -21.899999991, 0), x_dir=(1, 0, 0), z_dir=(0, 1, 0))):
        Polygon((-53.512357727, 11.9), (-53.512357727, 9.97317112), (-53.607784272, 10.079153036), align=None)
    extrude(amount=-CUT_EXTRUDE_14_DEPTH, mode=Mode.SUBTRACT)

    # 草图40 → 切除-拉伸15 (cut)
    with BuildSketch(Plane(origin=(0, 6.281370048, 0), x_dir=(1, 0, 0), z_dir=(0, 1, 0))):
        Polygon((-38.3, -6.921863751), (-35.306, -6.921863751), (-35.306, -8.437692972), (-37.015824752, -8.348084853), align=None)
    extrude(amount=-CUT_EXTRUDE_15_DEPTH, mode=Mode.SUBTRACT)

    # 草图42 → 凸台-拉伸9 (add)
    with BuildSketch(Plane.ZY.offset(38.3)):
        Polygon((-11.9, -21.899999991), (6.921863751, -21.899999991), (6.921863751, 0), (6.921863751, 6.281370048), (-11.9, 6.281370048), align=None)
    extrude(amount=EXTRUDE_9_DEPTH)


solid = part.part
